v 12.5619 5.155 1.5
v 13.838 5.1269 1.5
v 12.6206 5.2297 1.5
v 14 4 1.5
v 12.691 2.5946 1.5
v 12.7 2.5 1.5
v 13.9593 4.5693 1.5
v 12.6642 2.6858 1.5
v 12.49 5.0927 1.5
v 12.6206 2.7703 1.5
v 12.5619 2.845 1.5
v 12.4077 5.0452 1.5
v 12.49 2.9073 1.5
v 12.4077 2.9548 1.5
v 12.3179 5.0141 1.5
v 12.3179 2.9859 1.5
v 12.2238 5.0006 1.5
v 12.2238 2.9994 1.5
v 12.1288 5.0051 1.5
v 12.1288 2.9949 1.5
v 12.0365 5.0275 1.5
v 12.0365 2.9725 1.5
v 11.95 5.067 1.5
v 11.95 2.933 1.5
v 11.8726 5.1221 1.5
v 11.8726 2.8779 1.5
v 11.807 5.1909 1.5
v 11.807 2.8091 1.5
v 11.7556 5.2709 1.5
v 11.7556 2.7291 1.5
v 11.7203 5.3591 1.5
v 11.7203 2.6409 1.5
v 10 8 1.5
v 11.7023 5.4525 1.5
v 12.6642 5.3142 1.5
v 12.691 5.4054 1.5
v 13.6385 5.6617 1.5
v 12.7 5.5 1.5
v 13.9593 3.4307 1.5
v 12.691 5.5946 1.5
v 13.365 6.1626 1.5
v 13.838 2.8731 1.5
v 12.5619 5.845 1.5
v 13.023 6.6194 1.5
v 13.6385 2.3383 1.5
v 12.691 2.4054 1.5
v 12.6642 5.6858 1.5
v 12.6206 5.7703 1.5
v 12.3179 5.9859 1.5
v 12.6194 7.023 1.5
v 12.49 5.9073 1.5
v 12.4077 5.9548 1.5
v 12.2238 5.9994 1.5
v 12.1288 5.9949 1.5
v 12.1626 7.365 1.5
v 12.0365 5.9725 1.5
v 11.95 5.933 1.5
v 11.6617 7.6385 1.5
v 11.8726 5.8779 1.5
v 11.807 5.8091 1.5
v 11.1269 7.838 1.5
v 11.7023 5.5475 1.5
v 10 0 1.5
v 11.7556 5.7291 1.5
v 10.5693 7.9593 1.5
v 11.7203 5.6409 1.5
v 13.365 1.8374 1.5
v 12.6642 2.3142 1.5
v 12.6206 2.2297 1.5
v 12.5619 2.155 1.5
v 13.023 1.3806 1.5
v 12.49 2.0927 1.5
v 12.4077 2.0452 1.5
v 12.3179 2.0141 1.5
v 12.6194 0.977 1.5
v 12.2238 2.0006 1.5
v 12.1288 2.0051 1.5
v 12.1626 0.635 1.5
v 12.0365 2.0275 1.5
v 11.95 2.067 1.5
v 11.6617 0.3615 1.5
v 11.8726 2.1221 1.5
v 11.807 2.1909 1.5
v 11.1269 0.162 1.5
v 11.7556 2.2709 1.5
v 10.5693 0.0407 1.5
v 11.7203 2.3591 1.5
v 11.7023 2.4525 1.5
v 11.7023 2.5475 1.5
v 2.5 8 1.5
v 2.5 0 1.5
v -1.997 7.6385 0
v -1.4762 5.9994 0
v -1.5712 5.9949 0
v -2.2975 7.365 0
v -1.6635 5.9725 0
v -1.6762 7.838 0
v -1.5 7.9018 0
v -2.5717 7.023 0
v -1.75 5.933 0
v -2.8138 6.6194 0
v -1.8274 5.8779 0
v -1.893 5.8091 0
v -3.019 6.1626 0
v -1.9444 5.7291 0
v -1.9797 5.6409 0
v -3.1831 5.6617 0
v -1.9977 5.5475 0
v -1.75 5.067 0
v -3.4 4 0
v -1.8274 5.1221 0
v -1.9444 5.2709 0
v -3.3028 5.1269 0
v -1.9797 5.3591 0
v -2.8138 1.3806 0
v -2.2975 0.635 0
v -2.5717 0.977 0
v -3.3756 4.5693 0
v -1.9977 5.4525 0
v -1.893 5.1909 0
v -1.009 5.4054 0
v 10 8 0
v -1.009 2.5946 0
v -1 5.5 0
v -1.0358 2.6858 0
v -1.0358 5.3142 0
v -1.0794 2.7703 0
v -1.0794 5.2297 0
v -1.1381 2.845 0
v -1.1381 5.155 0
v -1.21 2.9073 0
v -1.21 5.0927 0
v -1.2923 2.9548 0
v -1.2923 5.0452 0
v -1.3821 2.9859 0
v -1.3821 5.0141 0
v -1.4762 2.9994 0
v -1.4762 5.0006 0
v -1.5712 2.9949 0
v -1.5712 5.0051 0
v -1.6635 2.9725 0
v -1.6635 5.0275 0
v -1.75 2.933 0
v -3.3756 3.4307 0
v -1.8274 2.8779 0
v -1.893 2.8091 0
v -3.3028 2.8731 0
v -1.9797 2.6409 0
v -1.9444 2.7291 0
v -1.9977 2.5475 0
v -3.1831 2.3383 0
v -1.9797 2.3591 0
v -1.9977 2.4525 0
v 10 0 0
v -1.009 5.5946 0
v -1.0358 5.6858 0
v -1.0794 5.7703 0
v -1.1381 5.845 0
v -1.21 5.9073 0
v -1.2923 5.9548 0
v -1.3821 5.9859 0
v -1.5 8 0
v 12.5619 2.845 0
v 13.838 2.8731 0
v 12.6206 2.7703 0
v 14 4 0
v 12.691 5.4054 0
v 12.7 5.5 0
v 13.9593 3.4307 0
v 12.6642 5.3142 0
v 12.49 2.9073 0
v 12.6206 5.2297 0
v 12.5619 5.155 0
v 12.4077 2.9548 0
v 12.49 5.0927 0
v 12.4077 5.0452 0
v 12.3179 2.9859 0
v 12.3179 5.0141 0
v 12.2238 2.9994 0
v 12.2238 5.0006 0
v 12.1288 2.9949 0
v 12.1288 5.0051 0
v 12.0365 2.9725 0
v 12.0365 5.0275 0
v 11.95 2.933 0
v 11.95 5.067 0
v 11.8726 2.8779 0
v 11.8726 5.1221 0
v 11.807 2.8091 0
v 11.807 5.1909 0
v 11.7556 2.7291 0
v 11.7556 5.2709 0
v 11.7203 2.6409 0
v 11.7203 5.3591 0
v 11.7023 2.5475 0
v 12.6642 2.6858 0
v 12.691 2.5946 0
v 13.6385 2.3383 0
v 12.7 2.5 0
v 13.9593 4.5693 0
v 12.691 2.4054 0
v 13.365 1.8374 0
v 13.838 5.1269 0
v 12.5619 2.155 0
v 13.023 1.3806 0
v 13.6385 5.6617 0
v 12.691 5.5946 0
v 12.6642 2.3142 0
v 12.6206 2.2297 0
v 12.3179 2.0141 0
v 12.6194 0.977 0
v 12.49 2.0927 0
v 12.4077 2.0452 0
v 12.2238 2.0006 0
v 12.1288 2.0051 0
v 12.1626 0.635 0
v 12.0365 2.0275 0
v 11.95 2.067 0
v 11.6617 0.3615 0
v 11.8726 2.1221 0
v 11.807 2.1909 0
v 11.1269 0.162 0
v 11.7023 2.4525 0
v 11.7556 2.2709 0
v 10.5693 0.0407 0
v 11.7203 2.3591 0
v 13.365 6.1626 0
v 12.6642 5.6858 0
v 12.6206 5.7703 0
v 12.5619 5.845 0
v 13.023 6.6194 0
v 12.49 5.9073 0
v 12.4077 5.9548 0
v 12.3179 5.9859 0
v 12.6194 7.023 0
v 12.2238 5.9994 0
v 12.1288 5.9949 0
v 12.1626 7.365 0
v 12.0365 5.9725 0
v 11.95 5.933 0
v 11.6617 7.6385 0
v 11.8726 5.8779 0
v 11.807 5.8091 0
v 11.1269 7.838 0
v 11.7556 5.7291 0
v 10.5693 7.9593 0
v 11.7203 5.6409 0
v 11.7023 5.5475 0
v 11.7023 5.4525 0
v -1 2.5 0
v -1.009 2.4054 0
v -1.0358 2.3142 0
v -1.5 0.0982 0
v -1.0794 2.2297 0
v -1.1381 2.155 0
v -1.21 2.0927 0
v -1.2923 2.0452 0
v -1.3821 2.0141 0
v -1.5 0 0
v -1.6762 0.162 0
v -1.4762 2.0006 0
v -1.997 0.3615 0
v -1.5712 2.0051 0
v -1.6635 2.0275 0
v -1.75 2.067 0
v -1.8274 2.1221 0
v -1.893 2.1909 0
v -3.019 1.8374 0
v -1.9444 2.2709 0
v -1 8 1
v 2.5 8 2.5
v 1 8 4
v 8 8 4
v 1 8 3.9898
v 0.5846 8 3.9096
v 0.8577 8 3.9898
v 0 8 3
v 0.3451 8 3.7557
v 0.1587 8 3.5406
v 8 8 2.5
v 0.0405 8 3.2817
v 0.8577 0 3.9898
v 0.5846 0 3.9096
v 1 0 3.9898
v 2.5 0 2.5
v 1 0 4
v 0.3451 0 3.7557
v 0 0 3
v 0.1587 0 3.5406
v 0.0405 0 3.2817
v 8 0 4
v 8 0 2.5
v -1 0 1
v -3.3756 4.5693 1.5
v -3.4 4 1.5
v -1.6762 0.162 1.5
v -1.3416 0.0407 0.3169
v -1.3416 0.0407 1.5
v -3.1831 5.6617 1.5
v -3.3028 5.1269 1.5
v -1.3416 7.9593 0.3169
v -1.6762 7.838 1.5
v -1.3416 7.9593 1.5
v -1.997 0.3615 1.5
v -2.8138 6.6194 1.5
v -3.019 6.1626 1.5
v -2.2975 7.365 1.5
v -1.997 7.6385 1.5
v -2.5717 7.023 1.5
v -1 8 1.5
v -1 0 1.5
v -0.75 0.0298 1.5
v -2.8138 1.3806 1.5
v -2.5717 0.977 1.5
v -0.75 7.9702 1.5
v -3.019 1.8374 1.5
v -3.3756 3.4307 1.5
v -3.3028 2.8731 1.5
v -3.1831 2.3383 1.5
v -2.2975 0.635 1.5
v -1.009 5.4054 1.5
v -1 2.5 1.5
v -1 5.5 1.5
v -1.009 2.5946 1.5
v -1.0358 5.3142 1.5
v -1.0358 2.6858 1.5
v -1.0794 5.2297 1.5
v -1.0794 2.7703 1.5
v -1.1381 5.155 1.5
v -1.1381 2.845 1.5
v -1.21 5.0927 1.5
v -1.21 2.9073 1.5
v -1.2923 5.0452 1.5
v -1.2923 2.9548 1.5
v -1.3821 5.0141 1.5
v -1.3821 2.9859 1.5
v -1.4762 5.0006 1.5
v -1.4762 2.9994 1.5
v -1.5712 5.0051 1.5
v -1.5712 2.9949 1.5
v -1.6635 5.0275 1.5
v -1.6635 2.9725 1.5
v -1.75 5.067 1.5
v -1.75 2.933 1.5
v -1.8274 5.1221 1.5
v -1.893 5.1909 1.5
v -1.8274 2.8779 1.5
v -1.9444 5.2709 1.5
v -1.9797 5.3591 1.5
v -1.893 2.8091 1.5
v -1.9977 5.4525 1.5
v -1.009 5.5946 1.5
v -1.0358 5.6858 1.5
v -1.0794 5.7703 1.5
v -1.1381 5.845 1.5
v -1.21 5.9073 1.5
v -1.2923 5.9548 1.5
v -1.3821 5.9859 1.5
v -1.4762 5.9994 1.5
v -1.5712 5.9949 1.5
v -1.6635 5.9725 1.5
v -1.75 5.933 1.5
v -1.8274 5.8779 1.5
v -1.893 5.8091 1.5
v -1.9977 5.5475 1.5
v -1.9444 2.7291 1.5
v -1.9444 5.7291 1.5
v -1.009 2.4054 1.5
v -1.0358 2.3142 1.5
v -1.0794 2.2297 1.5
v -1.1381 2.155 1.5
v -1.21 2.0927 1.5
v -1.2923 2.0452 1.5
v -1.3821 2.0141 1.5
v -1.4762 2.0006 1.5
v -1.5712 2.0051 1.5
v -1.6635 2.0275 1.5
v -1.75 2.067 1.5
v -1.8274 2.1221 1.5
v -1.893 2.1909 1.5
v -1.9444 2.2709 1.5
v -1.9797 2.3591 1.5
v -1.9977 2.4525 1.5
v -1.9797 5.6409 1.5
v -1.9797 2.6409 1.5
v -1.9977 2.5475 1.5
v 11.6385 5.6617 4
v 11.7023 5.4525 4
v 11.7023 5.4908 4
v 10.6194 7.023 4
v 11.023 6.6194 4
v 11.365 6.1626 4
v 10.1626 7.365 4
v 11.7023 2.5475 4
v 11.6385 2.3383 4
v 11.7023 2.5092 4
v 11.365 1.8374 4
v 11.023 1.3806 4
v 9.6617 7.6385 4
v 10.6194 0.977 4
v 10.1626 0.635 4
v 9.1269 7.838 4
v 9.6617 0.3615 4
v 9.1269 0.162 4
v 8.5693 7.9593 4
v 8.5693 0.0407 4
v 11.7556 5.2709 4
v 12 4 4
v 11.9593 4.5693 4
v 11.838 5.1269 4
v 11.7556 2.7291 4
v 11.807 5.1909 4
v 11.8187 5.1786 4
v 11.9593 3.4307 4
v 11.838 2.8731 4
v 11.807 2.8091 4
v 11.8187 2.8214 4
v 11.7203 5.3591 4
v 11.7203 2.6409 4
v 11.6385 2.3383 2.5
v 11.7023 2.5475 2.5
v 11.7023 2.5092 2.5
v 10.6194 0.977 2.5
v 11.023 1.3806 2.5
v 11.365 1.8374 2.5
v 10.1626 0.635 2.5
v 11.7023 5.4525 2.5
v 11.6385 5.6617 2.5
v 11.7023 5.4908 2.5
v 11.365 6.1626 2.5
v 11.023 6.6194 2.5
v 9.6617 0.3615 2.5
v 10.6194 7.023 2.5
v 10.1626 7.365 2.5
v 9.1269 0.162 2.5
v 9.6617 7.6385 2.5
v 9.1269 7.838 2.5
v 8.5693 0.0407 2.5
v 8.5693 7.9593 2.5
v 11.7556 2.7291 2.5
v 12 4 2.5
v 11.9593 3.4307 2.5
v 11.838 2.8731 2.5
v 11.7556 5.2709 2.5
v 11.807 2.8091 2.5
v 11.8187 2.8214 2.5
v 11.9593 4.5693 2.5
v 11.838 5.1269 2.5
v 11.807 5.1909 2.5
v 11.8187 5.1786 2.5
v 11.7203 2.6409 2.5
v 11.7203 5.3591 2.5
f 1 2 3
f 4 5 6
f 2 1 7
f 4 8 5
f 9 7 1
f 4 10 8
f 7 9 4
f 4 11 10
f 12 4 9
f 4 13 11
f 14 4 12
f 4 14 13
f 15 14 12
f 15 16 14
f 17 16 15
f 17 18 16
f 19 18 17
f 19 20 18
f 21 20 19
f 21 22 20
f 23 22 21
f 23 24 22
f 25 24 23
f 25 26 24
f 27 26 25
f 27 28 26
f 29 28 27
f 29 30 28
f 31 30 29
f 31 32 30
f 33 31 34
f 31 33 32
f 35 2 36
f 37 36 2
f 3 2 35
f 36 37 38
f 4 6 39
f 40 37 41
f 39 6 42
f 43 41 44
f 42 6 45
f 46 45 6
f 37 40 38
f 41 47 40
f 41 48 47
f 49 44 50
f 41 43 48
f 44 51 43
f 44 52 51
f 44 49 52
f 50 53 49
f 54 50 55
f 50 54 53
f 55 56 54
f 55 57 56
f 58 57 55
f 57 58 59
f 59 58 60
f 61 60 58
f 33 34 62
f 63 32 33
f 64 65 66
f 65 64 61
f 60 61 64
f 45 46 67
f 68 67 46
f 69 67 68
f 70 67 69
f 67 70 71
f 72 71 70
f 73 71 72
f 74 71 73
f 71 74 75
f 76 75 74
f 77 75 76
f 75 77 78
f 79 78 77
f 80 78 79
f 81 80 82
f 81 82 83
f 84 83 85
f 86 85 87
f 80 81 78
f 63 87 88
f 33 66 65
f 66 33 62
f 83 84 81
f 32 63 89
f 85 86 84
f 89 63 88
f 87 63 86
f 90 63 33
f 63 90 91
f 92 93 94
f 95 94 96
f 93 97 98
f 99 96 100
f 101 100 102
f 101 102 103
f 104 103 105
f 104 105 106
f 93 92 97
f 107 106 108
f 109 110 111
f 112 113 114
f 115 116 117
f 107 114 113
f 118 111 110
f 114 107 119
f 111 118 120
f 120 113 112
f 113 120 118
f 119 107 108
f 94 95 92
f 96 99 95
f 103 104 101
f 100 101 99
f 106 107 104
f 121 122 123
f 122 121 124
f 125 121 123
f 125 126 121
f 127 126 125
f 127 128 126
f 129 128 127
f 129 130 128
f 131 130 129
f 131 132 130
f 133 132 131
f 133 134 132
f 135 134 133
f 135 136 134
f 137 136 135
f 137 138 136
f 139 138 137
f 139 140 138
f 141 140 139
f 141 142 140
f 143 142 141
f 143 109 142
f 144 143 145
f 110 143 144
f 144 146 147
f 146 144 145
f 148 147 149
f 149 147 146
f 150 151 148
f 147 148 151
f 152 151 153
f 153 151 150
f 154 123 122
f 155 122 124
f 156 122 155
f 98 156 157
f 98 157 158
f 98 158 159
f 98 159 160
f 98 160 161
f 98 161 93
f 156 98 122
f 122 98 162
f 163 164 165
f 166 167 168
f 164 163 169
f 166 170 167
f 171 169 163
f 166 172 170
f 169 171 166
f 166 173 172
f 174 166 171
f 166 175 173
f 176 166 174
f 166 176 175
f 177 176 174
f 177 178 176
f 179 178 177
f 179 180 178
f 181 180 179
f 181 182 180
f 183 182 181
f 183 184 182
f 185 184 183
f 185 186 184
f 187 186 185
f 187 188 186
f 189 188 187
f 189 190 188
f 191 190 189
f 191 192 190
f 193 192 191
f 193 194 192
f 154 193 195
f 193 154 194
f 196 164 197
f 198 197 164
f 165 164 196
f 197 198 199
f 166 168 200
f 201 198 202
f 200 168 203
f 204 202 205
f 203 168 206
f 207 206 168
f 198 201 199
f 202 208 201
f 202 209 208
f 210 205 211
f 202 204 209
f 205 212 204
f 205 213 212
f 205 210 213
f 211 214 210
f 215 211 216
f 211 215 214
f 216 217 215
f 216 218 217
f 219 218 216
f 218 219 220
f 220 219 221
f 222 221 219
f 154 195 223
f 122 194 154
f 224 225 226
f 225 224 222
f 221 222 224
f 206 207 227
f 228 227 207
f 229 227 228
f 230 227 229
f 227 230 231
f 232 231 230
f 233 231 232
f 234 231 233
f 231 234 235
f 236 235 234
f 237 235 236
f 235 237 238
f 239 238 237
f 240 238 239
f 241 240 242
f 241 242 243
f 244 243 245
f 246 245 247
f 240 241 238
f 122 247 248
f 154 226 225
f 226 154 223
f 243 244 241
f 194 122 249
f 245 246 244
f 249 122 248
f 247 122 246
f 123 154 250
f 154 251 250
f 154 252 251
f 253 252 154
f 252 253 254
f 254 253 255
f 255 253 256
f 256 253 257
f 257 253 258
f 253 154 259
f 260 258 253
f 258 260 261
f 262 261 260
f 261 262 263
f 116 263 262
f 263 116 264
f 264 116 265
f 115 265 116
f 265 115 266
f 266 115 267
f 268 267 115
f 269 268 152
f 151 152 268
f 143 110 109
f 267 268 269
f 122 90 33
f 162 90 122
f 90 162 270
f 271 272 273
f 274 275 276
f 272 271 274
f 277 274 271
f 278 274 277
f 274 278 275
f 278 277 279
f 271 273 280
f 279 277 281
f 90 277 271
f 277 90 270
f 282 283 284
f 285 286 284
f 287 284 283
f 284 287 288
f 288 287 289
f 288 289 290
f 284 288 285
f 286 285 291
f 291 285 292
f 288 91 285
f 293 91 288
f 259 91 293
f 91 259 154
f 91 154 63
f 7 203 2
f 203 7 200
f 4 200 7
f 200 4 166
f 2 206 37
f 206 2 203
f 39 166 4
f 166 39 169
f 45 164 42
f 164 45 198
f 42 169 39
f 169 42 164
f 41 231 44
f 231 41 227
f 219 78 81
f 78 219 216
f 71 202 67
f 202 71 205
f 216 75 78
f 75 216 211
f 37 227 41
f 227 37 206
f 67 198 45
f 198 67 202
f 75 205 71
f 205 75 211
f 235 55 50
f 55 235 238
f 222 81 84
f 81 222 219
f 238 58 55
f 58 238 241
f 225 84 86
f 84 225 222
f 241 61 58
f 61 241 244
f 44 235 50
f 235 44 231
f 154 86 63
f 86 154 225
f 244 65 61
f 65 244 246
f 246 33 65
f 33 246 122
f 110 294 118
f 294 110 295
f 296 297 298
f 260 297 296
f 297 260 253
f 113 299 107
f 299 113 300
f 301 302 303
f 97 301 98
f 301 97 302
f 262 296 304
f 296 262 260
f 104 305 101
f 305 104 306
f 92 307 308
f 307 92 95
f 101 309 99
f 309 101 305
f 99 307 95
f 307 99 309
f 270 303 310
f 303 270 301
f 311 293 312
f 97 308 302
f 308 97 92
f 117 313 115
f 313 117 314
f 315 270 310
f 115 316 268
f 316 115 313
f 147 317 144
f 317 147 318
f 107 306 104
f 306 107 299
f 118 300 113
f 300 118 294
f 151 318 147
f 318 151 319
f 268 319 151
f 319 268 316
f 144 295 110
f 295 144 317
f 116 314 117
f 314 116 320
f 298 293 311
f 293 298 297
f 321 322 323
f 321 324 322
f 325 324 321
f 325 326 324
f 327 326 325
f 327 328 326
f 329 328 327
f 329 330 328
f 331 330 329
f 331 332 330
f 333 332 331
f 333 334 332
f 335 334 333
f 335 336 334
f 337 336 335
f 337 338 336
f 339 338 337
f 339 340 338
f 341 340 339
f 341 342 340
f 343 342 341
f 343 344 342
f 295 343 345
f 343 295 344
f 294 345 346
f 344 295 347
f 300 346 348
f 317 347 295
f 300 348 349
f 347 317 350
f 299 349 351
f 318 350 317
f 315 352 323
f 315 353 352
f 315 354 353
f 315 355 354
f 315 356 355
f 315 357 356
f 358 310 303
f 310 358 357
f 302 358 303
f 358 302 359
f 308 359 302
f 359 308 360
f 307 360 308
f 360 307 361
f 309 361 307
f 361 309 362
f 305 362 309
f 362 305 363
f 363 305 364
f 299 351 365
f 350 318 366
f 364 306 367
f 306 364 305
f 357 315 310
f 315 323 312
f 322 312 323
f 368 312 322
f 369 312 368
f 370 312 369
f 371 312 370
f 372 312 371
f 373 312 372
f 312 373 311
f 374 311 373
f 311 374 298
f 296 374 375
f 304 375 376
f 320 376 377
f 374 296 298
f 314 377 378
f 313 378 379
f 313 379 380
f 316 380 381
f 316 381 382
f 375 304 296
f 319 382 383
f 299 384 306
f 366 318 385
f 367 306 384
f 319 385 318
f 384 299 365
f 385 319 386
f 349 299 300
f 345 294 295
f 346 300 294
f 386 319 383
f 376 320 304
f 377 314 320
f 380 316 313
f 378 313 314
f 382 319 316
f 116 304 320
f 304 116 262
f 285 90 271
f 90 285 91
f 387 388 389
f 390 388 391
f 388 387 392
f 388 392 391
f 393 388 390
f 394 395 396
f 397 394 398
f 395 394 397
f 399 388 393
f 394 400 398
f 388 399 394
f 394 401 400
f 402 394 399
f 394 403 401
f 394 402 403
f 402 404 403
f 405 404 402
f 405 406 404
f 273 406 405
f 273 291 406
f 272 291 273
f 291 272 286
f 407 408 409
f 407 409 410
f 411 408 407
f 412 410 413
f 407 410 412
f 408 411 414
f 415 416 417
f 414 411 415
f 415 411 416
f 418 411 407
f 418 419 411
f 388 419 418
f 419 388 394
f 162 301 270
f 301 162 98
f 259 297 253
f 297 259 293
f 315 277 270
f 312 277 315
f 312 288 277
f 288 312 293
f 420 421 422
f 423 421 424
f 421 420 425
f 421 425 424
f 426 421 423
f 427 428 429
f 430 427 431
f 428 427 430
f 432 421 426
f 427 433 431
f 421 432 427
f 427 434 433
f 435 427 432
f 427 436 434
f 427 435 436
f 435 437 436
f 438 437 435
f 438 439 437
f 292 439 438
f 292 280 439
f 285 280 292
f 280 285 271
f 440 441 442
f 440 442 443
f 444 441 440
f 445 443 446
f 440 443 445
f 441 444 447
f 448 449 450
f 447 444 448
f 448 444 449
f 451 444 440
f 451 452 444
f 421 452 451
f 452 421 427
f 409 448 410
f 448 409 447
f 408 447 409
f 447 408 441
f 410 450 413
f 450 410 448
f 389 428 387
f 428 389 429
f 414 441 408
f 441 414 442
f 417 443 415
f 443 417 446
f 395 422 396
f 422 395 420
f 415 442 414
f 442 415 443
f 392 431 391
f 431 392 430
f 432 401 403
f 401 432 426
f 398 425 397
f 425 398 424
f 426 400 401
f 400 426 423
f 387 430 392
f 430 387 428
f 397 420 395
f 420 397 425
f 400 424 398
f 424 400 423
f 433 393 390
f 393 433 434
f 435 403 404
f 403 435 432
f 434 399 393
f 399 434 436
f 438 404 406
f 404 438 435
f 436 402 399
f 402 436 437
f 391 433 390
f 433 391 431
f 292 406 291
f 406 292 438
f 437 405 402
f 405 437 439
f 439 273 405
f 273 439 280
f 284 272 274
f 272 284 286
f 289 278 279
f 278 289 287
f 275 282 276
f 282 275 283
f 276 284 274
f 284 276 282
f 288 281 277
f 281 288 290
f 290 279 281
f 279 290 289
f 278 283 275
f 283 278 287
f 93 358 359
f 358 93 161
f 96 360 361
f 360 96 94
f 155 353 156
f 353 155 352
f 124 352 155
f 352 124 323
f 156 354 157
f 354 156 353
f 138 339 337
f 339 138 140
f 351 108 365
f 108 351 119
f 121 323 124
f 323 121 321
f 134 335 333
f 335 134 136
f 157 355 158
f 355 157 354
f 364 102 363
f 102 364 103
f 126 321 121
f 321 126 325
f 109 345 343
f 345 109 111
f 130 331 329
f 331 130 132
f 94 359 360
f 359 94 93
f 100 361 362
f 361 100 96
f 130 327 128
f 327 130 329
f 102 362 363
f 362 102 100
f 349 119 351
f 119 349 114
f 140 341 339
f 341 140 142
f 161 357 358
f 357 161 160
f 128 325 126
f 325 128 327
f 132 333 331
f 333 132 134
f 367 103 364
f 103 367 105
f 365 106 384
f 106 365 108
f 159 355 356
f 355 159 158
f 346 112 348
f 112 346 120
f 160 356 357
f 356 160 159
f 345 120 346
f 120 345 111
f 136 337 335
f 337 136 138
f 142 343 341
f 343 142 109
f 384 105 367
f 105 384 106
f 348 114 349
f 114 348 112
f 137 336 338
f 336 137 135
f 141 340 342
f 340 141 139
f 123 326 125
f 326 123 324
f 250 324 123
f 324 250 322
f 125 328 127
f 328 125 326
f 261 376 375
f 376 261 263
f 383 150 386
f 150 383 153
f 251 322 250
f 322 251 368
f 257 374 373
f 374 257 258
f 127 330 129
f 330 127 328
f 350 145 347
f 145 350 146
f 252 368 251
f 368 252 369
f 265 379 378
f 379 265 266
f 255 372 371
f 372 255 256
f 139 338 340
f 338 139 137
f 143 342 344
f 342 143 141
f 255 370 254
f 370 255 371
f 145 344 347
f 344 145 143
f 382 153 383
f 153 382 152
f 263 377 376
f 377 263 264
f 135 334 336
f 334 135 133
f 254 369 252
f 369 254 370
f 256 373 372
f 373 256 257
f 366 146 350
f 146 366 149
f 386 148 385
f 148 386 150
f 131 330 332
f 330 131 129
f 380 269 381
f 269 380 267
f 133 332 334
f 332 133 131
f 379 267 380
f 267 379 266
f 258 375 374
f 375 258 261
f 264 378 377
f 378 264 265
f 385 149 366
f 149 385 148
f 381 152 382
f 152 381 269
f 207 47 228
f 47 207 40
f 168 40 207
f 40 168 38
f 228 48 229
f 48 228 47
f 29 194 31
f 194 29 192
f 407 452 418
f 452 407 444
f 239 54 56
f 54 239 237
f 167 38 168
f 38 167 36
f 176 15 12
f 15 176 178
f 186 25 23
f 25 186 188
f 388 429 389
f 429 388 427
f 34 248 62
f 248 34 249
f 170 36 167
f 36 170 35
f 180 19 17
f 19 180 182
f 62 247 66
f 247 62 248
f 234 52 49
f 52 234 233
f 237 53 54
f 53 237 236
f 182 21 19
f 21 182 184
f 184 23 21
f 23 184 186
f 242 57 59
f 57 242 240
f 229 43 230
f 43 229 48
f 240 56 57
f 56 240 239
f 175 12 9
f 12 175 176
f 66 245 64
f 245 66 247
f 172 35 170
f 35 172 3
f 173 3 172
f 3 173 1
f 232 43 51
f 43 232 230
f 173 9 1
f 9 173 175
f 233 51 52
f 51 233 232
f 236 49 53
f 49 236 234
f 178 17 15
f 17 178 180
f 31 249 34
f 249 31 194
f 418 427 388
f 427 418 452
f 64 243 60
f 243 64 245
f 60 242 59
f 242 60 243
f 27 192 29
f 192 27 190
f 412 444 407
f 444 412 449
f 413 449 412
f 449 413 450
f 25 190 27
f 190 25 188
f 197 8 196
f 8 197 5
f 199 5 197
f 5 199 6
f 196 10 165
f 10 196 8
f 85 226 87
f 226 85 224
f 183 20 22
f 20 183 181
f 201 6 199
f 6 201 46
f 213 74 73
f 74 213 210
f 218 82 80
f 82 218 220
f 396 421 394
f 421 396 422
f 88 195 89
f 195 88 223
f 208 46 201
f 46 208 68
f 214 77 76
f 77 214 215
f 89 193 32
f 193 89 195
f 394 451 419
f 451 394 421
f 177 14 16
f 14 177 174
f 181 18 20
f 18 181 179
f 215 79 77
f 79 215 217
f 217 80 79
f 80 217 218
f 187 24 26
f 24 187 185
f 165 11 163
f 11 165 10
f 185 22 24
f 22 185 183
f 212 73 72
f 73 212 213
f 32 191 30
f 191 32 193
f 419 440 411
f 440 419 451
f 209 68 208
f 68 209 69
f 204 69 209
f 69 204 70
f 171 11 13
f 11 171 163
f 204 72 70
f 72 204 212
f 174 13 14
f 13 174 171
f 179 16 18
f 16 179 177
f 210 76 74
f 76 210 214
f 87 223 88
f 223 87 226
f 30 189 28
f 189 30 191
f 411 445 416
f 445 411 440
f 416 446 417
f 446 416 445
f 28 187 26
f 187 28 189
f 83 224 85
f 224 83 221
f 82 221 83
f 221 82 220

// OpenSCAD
// file: ../Parts/rounder.scad
// rounder.scad
// cutting tool for rounding off corners with a cylinder

//---------------------
module rounder(
r=10,   // radius
h=10,   // height
f=22,    // $fn
extra=0.01  // extra size for the cube
){

difference(){
  translate([-extra,-extra,-extra])
  cube([r+extra,r+extra,h+2*extra]);
  translate([r,r,-1])
  cylinder(r=r,h=h+2,$fn=f);
}

}

//========================

rounder();

//========================
// main file
// hathook.scad
// hooks to attach face mask elastics to your hat instead of ears.
use <../Parts/rounder.scad>

difference(){
  union(){
    // base
    cube([10,8,1.5]);
    translate([10,4,0])
    cylinder(r=4,h=1.5,$fn=44);
    translate([-1,4,0])
    scale([0.6,1,1])
    cylinder(r=4,h=1.5,$fn=44);

    // riser
    translate([2.5,8,0])
    rotate([0,0,180])
    linear_extrude(height=4,scale=[0.5,1])
    square([4,8]);
    //cube([2,8,3]);

    // hook
    translate([0,0,2.5])
    cube([8,8,1.5]);
    translate([8,4,2.5])
    cylinder(r=4,h=1.5,$fn=44);
  }
  translate([-1.5,5.5,2])
  cylinder(r=0.5,h=8,center=true,$fn=33);
  translate([-1.5,2.5,2])
  cylinder(r=0.5,h=8,center=true,$fn=33);

  translate([12.2,5.5,2])
  cylinder(r=0.5,h=8,center=true,$fn=33);
  translate([12.2,2.5,2])
  cylinder(r=0.5,h=8,center=true,$fn=33);

  color("red")
  translate([0,-1,4])
  rotate([-90,0,0])
  rounder(r=1,h=10,f=22);
}
